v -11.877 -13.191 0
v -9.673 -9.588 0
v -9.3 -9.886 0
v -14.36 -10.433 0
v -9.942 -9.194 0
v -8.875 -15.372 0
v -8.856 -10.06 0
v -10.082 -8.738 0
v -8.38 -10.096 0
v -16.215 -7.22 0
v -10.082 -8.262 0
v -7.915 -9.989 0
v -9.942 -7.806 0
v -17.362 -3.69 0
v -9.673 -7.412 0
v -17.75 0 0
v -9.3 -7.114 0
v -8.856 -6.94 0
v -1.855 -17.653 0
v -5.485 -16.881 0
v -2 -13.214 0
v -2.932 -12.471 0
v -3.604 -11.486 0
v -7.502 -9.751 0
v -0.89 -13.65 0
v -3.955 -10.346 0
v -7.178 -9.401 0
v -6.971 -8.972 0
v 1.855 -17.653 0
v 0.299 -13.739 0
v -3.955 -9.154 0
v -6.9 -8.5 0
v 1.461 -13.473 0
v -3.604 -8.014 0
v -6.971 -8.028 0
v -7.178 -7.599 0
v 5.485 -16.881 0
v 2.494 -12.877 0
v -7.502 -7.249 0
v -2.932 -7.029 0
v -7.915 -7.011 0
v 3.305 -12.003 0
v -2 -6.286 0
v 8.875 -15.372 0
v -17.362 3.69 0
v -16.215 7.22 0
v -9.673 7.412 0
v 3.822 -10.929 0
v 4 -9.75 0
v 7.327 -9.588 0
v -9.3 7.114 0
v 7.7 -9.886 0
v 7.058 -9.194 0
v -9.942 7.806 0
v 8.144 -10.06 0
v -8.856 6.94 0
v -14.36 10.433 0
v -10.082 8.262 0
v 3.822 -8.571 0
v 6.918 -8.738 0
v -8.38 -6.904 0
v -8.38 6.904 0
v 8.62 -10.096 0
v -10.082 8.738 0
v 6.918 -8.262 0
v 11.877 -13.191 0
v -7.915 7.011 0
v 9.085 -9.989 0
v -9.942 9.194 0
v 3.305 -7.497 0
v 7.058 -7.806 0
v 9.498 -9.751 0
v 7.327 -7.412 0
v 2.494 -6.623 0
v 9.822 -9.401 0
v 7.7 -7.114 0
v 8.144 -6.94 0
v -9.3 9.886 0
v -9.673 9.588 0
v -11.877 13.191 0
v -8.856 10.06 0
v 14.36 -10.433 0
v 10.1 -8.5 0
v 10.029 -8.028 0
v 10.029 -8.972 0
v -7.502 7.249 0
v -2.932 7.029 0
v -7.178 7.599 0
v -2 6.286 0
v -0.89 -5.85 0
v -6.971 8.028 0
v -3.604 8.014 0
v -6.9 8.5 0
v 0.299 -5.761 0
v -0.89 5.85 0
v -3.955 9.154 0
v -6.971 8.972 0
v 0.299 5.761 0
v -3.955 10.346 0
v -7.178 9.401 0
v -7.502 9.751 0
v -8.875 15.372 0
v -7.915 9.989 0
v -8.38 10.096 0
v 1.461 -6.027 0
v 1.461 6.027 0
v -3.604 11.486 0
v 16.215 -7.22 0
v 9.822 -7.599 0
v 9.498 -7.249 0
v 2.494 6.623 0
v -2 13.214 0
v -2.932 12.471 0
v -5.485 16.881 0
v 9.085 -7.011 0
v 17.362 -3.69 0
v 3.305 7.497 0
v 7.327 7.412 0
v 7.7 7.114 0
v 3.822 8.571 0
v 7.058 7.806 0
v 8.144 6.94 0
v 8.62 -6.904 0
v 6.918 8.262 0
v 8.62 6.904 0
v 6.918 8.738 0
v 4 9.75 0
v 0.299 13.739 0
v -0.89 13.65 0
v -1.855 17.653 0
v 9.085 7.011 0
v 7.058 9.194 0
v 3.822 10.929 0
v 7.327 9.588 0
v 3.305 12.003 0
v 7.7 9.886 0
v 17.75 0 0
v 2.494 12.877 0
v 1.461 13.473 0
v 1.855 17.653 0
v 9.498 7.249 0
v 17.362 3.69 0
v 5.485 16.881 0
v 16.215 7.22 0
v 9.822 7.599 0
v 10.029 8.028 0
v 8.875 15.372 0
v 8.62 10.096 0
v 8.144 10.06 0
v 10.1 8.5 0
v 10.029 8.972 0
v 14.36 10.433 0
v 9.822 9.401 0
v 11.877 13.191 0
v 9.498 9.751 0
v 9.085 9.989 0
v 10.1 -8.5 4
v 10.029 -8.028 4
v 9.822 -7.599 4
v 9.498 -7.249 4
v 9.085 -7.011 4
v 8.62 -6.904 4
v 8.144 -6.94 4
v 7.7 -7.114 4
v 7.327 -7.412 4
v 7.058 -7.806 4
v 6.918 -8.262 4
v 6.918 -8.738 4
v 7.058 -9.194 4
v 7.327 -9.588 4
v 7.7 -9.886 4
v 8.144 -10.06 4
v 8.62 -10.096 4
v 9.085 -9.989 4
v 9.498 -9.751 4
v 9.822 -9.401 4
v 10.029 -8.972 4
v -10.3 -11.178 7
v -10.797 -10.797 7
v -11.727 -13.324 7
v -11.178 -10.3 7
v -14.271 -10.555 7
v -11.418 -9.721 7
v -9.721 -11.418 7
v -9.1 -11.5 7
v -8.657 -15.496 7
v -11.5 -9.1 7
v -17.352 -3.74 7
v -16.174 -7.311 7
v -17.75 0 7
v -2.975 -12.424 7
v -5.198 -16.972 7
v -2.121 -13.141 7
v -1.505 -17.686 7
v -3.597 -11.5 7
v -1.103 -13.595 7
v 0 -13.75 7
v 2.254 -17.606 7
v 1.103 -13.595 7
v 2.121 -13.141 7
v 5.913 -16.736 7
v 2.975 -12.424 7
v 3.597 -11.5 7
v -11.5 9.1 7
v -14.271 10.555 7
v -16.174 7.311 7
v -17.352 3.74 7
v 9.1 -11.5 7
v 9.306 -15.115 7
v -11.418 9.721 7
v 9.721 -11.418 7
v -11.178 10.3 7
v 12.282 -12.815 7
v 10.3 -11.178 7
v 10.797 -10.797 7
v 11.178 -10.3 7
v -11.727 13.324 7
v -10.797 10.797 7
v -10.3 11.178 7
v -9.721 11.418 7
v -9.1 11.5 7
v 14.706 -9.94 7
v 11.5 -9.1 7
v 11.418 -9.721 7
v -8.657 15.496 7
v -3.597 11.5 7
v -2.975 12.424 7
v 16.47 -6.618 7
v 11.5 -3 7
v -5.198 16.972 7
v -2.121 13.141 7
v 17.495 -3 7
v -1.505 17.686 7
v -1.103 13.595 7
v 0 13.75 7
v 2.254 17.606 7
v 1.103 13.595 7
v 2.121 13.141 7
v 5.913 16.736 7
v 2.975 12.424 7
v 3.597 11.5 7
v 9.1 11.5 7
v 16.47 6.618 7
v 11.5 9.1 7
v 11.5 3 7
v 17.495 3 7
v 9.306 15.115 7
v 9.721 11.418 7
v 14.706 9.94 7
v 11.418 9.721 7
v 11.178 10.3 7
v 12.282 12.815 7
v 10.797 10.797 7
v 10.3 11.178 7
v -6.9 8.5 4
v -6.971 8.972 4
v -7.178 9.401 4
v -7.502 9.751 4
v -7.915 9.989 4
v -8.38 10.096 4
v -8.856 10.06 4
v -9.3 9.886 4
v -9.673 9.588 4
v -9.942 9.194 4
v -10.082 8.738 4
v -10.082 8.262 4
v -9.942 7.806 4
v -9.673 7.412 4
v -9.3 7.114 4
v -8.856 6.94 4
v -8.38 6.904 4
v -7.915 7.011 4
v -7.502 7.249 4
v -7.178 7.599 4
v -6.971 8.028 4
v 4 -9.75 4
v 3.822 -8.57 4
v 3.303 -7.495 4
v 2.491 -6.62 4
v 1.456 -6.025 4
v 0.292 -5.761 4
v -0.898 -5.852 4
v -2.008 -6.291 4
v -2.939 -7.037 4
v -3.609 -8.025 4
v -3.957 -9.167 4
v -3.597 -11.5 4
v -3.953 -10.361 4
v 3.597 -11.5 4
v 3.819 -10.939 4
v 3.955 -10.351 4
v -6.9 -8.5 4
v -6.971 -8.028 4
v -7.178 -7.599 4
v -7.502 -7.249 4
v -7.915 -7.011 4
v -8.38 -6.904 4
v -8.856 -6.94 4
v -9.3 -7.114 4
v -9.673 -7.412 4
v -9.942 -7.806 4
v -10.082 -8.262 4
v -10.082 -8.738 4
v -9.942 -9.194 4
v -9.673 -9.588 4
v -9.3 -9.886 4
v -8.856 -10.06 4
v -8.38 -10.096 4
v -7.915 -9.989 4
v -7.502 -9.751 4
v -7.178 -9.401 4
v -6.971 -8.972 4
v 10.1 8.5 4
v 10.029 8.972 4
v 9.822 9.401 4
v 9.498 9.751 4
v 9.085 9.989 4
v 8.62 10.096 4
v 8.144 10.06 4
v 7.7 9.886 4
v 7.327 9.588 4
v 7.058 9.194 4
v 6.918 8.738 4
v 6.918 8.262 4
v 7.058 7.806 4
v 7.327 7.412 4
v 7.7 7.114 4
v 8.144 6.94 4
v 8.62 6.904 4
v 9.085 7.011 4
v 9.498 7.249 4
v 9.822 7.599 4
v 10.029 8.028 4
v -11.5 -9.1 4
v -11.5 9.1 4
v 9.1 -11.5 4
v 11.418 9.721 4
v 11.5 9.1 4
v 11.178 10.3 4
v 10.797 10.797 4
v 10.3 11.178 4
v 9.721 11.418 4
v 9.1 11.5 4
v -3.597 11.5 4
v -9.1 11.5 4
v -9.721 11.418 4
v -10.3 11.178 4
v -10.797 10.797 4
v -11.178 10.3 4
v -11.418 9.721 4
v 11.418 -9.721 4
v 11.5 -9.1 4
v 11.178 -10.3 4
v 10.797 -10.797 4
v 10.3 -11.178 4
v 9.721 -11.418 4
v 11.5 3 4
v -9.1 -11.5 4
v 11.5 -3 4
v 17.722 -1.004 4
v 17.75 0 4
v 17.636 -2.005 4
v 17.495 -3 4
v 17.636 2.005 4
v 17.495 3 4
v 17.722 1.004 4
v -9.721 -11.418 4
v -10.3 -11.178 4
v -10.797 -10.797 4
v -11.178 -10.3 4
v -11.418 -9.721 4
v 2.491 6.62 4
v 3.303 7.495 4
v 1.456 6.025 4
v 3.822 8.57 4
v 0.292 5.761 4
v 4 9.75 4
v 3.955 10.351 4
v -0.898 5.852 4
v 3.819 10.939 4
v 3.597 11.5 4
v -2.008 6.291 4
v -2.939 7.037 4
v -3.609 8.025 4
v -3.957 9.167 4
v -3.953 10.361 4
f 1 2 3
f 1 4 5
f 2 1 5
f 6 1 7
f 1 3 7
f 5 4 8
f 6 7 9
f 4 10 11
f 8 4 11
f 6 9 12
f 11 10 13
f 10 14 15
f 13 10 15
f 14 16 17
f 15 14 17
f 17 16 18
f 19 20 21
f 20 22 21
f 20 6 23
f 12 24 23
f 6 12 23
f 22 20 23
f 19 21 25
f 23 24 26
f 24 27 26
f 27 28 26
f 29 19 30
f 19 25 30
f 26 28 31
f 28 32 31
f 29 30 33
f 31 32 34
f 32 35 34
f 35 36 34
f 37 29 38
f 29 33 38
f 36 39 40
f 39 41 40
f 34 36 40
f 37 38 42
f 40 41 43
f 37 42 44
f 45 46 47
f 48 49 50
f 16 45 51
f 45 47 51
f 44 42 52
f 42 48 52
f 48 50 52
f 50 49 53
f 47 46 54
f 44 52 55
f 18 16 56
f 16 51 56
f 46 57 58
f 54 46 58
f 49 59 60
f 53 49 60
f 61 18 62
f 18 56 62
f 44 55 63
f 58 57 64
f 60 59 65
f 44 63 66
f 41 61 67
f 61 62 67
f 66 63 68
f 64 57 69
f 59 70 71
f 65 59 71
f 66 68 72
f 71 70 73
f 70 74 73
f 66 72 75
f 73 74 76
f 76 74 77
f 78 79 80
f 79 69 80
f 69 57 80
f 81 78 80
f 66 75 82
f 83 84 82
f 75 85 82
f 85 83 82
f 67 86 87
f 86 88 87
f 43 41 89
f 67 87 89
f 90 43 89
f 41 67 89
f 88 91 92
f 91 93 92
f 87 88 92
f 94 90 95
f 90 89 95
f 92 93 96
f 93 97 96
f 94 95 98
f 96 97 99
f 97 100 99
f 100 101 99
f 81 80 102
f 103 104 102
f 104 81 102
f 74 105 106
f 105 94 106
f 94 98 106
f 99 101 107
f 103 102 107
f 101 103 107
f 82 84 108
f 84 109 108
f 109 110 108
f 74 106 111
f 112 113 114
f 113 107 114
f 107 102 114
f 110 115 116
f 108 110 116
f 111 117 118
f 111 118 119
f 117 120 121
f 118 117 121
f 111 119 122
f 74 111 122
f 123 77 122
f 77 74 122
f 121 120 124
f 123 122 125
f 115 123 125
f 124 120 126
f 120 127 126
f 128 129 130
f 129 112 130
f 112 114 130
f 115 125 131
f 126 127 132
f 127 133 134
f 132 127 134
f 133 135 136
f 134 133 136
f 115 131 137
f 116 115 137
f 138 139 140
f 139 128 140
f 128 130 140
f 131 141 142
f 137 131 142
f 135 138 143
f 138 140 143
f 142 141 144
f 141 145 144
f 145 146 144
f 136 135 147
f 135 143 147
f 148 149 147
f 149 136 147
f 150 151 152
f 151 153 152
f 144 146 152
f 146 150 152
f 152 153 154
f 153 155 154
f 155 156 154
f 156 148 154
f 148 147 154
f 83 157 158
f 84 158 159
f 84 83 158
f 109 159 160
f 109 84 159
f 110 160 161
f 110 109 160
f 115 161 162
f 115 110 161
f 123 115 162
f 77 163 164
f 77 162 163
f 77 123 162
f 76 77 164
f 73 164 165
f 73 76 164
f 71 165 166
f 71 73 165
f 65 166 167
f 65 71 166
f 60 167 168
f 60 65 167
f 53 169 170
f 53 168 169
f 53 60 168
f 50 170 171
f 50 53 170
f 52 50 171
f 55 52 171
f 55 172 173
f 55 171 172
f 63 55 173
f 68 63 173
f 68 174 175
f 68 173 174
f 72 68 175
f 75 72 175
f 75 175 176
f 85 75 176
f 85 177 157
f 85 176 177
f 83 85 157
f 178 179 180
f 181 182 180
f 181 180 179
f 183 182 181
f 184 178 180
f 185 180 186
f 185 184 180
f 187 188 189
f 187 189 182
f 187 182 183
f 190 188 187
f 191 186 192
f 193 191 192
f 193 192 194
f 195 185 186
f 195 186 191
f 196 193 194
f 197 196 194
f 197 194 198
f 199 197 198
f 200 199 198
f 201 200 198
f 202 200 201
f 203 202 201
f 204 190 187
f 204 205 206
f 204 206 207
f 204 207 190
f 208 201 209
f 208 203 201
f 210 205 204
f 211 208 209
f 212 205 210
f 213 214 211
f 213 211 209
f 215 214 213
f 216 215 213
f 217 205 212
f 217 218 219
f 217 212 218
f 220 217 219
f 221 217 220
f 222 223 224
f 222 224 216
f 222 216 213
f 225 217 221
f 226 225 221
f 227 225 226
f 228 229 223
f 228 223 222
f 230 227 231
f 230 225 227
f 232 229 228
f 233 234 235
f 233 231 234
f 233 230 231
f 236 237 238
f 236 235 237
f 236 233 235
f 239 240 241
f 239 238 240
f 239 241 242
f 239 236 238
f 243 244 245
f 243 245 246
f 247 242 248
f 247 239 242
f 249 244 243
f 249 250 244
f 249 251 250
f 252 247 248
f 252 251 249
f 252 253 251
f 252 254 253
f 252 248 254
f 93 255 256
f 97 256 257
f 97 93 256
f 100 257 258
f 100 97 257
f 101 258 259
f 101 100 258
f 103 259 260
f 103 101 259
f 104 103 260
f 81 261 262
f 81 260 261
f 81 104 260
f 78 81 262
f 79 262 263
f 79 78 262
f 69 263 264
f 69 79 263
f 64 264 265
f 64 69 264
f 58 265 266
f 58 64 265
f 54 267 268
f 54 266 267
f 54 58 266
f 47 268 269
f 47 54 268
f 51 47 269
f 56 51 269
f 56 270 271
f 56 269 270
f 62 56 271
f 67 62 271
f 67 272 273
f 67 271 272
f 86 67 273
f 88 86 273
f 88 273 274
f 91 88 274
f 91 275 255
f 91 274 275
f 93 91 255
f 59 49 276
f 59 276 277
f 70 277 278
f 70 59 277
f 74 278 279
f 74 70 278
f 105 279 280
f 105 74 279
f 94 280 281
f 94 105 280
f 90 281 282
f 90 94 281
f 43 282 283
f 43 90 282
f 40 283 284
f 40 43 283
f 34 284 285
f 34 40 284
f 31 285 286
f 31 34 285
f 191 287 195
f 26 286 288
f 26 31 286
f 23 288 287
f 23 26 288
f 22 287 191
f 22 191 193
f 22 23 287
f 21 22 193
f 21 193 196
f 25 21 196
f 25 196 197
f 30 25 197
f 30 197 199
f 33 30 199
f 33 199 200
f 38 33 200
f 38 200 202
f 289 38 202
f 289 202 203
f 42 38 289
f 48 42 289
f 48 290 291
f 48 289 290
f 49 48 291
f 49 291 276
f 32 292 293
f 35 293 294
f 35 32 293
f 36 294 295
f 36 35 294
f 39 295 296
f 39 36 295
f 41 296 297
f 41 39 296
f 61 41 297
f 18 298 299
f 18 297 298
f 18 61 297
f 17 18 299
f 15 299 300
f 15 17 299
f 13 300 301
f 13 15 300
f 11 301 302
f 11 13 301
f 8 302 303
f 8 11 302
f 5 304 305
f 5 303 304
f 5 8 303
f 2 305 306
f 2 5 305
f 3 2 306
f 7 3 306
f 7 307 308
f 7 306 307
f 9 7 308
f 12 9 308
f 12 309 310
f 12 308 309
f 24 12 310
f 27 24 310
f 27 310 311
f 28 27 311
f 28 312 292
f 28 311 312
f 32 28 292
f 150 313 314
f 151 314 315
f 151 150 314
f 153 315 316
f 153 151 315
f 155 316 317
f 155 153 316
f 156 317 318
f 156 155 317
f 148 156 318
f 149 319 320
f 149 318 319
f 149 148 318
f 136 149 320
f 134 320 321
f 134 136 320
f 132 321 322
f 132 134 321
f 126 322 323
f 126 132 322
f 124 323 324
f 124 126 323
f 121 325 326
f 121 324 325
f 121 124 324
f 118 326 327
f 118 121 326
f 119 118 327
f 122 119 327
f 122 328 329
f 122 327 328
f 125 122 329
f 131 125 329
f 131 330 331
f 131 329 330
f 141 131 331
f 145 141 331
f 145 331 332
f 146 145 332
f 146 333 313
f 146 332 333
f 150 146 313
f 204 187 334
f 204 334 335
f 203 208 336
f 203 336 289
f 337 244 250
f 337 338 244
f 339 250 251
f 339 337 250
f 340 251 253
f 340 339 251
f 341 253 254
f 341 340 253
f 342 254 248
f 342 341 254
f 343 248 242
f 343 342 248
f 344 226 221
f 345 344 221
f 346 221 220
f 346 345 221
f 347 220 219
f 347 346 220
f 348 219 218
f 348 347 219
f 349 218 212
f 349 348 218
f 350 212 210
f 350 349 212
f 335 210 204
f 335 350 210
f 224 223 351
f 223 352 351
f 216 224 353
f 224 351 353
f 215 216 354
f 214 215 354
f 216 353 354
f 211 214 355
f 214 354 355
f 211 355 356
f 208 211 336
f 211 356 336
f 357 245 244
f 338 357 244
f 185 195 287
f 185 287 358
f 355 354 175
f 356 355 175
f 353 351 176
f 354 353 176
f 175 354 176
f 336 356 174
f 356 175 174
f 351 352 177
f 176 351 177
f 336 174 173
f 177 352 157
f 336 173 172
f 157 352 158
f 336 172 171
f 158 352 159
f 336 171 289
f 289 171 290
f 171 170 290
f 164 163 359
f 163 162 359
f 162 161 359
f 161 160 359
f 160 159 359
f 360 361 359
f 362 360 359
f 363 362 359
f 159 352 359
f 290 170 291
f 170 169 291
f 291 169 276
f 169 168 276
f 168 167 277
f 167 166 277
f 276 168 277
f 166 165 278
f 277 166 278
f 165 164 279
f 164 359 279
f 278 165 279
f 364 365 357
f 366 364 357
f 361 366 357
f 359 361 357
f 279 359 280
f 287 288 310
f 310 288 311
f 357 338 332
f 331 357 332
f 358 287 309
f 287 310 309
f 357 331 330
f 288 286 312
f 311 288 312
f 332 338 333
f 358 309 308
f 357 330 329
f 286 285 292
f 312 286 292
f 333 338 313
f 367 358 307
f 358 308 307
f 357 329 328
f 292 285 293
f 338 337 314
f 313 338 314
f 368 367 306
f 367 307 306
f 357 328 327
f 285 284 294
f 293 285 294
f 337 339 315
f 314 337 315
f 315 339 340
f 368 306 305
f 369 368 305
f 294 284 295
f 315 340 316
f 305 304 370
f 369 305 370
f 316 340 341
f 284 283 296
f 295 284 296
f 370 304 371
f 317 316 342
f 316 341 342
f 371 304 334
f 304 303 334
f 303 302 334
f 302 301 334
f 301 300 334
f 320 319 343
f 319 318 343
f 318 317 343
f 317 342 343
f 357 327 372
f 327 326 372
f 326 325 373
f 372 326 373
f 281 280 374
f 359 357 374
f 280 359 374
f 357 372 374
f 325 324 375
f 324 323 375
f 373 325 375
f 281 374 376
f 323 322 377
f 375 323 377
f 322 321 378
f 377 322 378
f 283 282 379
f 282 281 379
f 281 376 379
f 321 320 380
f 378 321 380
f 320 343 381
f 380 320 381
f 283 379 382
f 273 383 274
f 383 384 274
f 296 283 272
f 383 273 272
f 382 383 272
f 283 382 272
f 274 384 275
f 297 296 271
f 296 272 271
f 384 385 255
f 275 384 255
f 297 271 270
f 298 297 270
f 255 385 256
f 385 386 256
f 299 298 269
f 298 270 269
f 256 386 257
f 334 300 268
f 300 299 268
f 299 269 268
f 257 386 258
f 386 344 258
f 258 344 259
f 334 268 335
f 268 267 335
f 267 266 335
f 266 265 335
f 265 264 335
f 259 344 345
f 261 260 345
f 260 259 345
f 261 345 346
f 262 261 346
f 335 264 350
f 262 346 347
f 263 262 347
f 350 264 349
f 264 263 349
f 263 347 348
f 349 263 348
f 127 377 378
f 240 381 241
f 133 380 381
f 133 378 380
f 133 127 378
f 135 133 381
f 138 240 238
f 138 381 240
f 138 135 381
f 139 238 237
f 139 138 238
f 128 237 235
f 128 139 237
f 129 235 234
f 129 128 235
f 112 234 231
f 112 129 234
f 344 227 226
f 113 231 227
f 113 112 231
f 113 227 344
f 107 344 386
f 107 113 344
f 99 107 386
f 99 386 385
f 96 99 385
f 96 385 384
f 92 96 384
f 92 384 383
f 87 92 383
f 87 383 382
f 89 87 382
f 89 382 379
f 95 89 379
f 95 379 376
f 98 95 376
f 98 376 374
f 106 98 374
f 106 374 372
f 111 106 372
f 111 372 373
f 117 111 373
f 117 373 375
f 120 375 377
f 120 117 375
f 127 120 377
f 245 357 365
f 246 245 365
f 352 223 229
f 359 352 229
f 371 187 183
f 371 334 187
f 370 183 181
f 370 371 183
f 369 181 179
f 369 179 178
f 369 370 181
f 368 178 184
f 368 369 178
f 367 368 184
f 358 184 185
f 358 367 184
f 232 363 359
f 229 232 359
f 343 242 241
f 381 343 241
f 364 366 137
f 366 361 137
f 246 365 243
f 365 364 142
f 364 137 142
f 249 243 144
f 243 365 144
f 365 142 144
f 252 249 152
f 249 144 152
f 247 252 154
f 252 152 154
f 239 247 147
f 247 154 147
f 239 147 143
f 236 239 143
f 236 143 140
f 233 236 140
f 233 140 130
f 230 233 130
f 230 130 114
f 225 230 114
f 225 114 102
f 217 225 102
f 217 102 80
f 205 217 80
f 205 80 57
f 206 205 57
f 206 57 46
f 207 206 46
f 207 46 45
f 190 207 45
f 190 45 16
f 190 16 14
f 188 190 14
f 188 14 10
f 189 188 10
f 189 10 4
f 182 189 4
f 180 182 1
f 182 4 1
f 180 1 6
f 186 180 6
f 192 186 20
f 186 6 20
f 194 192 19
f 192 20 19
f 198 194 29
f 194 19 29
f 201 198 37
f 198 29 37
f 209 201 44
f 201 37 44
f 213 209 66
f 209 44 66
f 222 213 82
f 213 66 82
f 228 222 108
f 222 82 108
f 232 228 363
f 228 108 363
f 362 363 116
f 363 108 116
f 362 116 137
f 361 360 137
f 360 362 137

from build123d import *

# Parameters (mm, degrees)
SKETCH1_R           = 17.75
SKETCH1_R_2         = 4
BOSS_EXTRUDE1_DEPTH = 7
CUT_EXTRUDE1_START  = 7
SKETCH1_3_W         = 23
SKETCH1_3_H         = 23
SKETCH1_3_R         = 1.6
CUT_EXTRUDE1_DEPTH  = 3
SKETCH1_4_R         = 1.6
CUT_EXTRUDE3_DEPTH  = 27.060026861
CUT_EXTRUDE4_START  = -3
CUT_EXTRUDE4_DEPTH  = 3
FILLET1_R           = 2.4


with BuildPart() as part:
    # Sketch1 → Boss-Extrude1 (new body)
    with BuildSketch(Plane(origin=(0, 0, 0), x_dir=(0, 1, 0), z_dir=(0, 0, 1))):
        with Locations(Location((0, 0, 0), (0, 0, 270))):
            Circle(SKETCH1_R)
        with Locations(Location((9.75, 0, 0), (0, 0, 270))):
            Circle(SKETCH1_R_2, mode=Mode.SUBTRACT)
        with Locations(Location((-9.75, 0, 0), (0, 0, 270))):
            Circle(SKETCH1_R_2, mode=Mode.SUBTRACT)
    extrude(amount=BOSS_EXTRUDE1_DEPTH)

    # Sketch1<3> → Cut-Extrude1 (cut)
    # profile 1 of 5: a face of its own
    with BuildSketch(Plane(origin=(0, 0, 0), x_dir=(0, 1, 0), z_dir=(0, 0, 1)).offset(CUT_EXTRUDE1_START)):
        Rectangle(SKETCH1_3_W, SKETCH1_3_H)
        with Locations((-8.5, -8.5)):
            Circle(SKETCH1_3_R, mode=Mode.SUBTRACT)
        with Locations((8.5, -8.5)):
            Circle(SKETCH1_3_R, mode=Mode.SUBTRACT)
        with Locations((8.5, 8.5)):
            Circle(SKETCH1_3_R, mode=Mode.SUBTRACT)
        with Locations((-8.5, 8.5)):
            Circle(SKETCH1_3_R, mode=Mode.SUBTRACT)
    # profile 2 of 5: a face of its own
    with BuildSketch(Plane(origin=(0, 0, 0), x_dir=(0, 1, 0), z_dir=(0, 0, 1)).offset(CUT_EXTRUDE1_START)):
        with Locations((-8.5, 8.5)):
            Circle(SKETCH1_3_R)
    # profile 3 of 5: a face of its own
    with BuildSketch(Plane(origin=(0, 0, 0), x_dir=(0, 1, 0), z_dir=(0, 0, 1)).offset(CUT_EXTRUDE1_START)):
        with Locations((8.5, 8.5)):
            Circle(SKETCH1_3_R)
    # profile 4 of 5: a face of its own
    with BuildSketch(Plane(origin=(0, 0, 0), x_dir=(0, 1, 0), z_dir=(0, 0, 1)).offset(CUT_EXTRUDE1_START)):
        with Locations((-8.5, -8.5)):
            Circle(SKETCH1_3_R)
    # profile 5 of 5: a face of its own
    with BuildSketch(Plane(origin=(0, 0, 0), x_dir=(0, 1, 0), z_dir=(0, 0, 1)).offset(CUT_EXTRUDE1_START)):
        with Locations((8.5, -8.5)):
            Circle(SKETCH1_3_R)
    extrude(amount=-CUT_EXTRUDE1_DEPTH, mode=Mode.SUBTRACT)

    # Sketch1<4> → Cut-Extrude3 (cut, through all)
    with BuildSketch(Plane(origin=(0, 0, 0), x_dir=(0, 1, 0), z_dir=(0, 0, 1))):
        with Locations(Location((-8.5, -8.5, 0), (0, 0, 270))):
            Circle(SKETCH1_4_R)
        with Locations(Location((8.5, -8.5, 0), (0, 0, 270))):
            Circle(SKETCH1_4_R)
        with Locations(Location((8.5, 8.5, 0), (0, 0, 270))):
            Circle(SKETCH1_4_R)
        with Locations(Location((-8.5, 8.5, 0), (0, 0, 270))):
            Circle(SKETCH1_4_R)
    extrude(amount=CUT_EXTRUDE3_DEPTH, mode=Mode.SUBTRACT)

    # Sketch2 → Cut-Extrude4 (cut)
    with BuildSketch(Plane.XY.offset(7).offset(CUT_EXTRUDE4_START)):
        with BuildLine():
            Line((11.5, 3), (17.494642037, 3))
            ThreePointArc((17.494642037, 3), (17.75, 0), (17.494642037, -3))
            Line((17.494642037, -3), (11.5, -3))
            Line((11.5, -3), (11.5, 3))
        make_face()
    extrude(amount=CUT_EXTRUDE4_DEPTH, mode=Mode.SUBTRACT)

    # Fillet1
    fillet1_edges = [part.edges().sort_by_distance(p)[0] for p in [
        (-11.5, -11.5, 5.5),
        (-11.5, 11.5, 5.5),
        (11.5, 11.5, 5.5),
        (11.5, -11.5, 5.5),
    ]]
    fillet(fillet1_edges, radius=FILLET1_R)


solid = part.part
